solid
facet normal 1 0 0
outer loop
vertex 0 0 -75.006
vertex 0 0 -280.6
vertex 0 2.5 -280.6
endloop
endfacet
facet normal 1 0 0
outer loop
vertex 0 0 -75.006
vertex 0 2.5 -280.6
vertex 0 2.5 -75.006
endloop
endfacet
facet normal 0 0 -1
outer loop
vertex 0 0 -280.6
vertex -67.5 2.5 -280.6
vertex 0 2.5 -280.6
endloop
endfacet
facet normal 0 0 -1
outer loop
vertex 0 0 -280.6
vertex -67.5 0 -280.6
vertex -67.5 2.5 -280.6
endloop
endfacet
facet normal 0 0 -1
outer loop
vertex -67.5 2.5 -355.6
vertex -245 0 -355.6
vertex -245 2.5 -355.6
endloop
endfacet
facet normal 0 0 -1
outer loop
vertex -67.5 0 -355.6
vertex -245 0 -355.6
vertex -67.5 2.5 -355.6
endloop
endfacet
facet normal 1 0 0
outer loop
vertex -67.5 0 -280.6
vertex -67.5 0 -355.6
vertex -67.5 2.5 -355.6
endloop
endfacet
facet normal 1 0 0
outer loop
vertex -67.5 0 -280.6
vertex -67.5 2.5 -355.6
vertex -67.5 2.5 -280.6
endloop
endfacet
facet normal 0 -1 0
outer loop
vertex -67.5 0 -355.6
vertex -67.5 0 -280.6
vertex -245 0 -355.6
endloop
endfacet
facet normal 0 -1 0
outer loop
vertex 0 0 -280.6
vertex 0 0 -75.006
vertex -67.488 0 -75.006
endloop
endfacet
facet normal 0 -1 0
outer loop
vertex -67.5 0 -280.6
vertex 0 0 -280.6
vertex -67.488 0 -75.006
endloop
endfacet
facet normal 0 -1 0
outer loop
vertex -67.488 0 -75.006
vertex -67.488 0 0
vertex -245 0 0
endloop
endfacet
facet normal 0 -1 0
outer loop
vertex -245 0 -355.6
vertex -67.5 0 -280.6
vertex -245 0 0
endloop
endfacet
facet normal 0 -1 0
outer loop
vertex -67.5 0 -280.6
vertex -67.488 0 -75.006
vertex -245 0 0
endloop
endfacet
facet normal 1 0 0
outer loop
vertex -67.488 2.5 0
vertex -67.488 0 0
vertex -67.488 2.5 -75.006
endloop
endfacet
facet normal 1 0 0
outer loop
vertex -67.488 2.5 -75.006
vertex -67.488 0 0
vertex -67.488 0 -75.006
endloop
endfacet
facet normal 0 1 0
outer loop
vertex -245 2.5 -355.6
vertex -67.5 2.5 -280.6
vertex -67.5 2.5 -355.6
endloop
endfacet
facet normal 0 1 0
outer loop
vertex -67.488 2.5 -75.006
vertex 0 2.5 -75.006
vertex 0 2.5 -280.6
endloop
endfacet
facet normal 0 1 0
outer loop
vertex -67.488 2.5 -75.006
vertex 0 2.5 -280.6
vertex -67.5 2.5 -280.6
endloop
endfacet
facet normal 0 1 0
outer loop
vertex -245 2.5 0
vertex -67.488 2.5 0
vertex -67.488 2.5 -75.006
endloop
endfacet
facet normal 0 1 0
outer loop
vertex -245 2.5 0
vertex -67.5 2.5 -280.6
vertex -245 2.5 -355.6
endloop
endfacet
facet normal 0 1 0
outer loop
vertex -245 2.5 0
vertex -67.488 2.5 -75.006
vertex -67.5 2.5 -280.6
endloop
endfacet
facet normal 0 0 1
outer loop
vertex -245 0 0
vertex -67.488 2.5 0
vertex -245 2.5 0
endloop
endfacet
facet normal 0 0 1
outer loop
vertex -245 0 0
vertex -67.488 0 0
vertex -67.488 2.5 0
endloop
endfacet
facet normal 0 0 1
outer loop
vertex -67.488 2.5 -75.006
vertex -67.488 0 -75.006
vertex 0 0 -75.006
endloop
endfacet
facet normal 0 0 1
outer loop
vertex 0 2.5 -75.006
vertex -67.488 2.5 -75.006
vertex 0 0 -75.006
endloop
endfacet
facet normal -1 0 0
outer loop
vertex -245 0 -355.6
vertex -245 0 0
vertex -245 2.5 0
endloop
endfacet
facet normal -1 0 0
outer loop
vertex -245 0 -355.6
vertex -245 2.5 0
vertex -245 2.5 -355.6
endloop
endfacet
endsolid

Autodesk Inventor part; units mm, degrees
ref_plane "YZ Plane" through (0, 0, 0) normal (1, 0, 0) x (0, 1, 0)
ref_plane "XZ Plane" through (0, 0, 0) normal (0, 1, 0) x (-1, 0, 0)
ref_plane "XY Plane" through (0, 0, 0) normal (0, 0, 1) x (1, 0, 0)
sketch "Sketch1" plane through (0, 0, 0) normal (0, 1, 0) x (-1, 0, 0)
  line L0 (0, 0) -> (245, 0)
  line L1 (245, 0) -> (245, -355.6)
  line L2 (245, -355.6) -> (0, -355.6)
  line L3 (0, -355.6) -> (0, 0)
  line L4 (0, -355.6) -> (67.5, -355.6)
  line L5 (67.5, -355.6) -> (67.5, -280.6)
  line L6 (67.5, -280.6) -> (0, -280.6)
  line L7 (0, -280.6) -> (0, -355.6)
  line L8 (0, 0) -> (67.4878, 0)
  line L9 (67.4878, 0) -> (67.4878, -75.0062)
  line L10 (67.4878, -75.0062) -> (0, -75.0062)
  line L11 (0, -75.0062) -> (0, 0)
  dimension "d0" = 245
  dimension "d1" = 355.6
  dimension "d2" = 67.5
  dimension "d3" = 75
  dimension "d4" = 67.4878
  dimension "d5" = 75.0062
extrude "Extrusion1" add sketch "Sketch1" along normal blind 2.5 contours L0 L1 L2 L5 L6 L3 L10 L9
properties part number "Plexiglass Mounting Sheet" material "Acrylic, Clear"
